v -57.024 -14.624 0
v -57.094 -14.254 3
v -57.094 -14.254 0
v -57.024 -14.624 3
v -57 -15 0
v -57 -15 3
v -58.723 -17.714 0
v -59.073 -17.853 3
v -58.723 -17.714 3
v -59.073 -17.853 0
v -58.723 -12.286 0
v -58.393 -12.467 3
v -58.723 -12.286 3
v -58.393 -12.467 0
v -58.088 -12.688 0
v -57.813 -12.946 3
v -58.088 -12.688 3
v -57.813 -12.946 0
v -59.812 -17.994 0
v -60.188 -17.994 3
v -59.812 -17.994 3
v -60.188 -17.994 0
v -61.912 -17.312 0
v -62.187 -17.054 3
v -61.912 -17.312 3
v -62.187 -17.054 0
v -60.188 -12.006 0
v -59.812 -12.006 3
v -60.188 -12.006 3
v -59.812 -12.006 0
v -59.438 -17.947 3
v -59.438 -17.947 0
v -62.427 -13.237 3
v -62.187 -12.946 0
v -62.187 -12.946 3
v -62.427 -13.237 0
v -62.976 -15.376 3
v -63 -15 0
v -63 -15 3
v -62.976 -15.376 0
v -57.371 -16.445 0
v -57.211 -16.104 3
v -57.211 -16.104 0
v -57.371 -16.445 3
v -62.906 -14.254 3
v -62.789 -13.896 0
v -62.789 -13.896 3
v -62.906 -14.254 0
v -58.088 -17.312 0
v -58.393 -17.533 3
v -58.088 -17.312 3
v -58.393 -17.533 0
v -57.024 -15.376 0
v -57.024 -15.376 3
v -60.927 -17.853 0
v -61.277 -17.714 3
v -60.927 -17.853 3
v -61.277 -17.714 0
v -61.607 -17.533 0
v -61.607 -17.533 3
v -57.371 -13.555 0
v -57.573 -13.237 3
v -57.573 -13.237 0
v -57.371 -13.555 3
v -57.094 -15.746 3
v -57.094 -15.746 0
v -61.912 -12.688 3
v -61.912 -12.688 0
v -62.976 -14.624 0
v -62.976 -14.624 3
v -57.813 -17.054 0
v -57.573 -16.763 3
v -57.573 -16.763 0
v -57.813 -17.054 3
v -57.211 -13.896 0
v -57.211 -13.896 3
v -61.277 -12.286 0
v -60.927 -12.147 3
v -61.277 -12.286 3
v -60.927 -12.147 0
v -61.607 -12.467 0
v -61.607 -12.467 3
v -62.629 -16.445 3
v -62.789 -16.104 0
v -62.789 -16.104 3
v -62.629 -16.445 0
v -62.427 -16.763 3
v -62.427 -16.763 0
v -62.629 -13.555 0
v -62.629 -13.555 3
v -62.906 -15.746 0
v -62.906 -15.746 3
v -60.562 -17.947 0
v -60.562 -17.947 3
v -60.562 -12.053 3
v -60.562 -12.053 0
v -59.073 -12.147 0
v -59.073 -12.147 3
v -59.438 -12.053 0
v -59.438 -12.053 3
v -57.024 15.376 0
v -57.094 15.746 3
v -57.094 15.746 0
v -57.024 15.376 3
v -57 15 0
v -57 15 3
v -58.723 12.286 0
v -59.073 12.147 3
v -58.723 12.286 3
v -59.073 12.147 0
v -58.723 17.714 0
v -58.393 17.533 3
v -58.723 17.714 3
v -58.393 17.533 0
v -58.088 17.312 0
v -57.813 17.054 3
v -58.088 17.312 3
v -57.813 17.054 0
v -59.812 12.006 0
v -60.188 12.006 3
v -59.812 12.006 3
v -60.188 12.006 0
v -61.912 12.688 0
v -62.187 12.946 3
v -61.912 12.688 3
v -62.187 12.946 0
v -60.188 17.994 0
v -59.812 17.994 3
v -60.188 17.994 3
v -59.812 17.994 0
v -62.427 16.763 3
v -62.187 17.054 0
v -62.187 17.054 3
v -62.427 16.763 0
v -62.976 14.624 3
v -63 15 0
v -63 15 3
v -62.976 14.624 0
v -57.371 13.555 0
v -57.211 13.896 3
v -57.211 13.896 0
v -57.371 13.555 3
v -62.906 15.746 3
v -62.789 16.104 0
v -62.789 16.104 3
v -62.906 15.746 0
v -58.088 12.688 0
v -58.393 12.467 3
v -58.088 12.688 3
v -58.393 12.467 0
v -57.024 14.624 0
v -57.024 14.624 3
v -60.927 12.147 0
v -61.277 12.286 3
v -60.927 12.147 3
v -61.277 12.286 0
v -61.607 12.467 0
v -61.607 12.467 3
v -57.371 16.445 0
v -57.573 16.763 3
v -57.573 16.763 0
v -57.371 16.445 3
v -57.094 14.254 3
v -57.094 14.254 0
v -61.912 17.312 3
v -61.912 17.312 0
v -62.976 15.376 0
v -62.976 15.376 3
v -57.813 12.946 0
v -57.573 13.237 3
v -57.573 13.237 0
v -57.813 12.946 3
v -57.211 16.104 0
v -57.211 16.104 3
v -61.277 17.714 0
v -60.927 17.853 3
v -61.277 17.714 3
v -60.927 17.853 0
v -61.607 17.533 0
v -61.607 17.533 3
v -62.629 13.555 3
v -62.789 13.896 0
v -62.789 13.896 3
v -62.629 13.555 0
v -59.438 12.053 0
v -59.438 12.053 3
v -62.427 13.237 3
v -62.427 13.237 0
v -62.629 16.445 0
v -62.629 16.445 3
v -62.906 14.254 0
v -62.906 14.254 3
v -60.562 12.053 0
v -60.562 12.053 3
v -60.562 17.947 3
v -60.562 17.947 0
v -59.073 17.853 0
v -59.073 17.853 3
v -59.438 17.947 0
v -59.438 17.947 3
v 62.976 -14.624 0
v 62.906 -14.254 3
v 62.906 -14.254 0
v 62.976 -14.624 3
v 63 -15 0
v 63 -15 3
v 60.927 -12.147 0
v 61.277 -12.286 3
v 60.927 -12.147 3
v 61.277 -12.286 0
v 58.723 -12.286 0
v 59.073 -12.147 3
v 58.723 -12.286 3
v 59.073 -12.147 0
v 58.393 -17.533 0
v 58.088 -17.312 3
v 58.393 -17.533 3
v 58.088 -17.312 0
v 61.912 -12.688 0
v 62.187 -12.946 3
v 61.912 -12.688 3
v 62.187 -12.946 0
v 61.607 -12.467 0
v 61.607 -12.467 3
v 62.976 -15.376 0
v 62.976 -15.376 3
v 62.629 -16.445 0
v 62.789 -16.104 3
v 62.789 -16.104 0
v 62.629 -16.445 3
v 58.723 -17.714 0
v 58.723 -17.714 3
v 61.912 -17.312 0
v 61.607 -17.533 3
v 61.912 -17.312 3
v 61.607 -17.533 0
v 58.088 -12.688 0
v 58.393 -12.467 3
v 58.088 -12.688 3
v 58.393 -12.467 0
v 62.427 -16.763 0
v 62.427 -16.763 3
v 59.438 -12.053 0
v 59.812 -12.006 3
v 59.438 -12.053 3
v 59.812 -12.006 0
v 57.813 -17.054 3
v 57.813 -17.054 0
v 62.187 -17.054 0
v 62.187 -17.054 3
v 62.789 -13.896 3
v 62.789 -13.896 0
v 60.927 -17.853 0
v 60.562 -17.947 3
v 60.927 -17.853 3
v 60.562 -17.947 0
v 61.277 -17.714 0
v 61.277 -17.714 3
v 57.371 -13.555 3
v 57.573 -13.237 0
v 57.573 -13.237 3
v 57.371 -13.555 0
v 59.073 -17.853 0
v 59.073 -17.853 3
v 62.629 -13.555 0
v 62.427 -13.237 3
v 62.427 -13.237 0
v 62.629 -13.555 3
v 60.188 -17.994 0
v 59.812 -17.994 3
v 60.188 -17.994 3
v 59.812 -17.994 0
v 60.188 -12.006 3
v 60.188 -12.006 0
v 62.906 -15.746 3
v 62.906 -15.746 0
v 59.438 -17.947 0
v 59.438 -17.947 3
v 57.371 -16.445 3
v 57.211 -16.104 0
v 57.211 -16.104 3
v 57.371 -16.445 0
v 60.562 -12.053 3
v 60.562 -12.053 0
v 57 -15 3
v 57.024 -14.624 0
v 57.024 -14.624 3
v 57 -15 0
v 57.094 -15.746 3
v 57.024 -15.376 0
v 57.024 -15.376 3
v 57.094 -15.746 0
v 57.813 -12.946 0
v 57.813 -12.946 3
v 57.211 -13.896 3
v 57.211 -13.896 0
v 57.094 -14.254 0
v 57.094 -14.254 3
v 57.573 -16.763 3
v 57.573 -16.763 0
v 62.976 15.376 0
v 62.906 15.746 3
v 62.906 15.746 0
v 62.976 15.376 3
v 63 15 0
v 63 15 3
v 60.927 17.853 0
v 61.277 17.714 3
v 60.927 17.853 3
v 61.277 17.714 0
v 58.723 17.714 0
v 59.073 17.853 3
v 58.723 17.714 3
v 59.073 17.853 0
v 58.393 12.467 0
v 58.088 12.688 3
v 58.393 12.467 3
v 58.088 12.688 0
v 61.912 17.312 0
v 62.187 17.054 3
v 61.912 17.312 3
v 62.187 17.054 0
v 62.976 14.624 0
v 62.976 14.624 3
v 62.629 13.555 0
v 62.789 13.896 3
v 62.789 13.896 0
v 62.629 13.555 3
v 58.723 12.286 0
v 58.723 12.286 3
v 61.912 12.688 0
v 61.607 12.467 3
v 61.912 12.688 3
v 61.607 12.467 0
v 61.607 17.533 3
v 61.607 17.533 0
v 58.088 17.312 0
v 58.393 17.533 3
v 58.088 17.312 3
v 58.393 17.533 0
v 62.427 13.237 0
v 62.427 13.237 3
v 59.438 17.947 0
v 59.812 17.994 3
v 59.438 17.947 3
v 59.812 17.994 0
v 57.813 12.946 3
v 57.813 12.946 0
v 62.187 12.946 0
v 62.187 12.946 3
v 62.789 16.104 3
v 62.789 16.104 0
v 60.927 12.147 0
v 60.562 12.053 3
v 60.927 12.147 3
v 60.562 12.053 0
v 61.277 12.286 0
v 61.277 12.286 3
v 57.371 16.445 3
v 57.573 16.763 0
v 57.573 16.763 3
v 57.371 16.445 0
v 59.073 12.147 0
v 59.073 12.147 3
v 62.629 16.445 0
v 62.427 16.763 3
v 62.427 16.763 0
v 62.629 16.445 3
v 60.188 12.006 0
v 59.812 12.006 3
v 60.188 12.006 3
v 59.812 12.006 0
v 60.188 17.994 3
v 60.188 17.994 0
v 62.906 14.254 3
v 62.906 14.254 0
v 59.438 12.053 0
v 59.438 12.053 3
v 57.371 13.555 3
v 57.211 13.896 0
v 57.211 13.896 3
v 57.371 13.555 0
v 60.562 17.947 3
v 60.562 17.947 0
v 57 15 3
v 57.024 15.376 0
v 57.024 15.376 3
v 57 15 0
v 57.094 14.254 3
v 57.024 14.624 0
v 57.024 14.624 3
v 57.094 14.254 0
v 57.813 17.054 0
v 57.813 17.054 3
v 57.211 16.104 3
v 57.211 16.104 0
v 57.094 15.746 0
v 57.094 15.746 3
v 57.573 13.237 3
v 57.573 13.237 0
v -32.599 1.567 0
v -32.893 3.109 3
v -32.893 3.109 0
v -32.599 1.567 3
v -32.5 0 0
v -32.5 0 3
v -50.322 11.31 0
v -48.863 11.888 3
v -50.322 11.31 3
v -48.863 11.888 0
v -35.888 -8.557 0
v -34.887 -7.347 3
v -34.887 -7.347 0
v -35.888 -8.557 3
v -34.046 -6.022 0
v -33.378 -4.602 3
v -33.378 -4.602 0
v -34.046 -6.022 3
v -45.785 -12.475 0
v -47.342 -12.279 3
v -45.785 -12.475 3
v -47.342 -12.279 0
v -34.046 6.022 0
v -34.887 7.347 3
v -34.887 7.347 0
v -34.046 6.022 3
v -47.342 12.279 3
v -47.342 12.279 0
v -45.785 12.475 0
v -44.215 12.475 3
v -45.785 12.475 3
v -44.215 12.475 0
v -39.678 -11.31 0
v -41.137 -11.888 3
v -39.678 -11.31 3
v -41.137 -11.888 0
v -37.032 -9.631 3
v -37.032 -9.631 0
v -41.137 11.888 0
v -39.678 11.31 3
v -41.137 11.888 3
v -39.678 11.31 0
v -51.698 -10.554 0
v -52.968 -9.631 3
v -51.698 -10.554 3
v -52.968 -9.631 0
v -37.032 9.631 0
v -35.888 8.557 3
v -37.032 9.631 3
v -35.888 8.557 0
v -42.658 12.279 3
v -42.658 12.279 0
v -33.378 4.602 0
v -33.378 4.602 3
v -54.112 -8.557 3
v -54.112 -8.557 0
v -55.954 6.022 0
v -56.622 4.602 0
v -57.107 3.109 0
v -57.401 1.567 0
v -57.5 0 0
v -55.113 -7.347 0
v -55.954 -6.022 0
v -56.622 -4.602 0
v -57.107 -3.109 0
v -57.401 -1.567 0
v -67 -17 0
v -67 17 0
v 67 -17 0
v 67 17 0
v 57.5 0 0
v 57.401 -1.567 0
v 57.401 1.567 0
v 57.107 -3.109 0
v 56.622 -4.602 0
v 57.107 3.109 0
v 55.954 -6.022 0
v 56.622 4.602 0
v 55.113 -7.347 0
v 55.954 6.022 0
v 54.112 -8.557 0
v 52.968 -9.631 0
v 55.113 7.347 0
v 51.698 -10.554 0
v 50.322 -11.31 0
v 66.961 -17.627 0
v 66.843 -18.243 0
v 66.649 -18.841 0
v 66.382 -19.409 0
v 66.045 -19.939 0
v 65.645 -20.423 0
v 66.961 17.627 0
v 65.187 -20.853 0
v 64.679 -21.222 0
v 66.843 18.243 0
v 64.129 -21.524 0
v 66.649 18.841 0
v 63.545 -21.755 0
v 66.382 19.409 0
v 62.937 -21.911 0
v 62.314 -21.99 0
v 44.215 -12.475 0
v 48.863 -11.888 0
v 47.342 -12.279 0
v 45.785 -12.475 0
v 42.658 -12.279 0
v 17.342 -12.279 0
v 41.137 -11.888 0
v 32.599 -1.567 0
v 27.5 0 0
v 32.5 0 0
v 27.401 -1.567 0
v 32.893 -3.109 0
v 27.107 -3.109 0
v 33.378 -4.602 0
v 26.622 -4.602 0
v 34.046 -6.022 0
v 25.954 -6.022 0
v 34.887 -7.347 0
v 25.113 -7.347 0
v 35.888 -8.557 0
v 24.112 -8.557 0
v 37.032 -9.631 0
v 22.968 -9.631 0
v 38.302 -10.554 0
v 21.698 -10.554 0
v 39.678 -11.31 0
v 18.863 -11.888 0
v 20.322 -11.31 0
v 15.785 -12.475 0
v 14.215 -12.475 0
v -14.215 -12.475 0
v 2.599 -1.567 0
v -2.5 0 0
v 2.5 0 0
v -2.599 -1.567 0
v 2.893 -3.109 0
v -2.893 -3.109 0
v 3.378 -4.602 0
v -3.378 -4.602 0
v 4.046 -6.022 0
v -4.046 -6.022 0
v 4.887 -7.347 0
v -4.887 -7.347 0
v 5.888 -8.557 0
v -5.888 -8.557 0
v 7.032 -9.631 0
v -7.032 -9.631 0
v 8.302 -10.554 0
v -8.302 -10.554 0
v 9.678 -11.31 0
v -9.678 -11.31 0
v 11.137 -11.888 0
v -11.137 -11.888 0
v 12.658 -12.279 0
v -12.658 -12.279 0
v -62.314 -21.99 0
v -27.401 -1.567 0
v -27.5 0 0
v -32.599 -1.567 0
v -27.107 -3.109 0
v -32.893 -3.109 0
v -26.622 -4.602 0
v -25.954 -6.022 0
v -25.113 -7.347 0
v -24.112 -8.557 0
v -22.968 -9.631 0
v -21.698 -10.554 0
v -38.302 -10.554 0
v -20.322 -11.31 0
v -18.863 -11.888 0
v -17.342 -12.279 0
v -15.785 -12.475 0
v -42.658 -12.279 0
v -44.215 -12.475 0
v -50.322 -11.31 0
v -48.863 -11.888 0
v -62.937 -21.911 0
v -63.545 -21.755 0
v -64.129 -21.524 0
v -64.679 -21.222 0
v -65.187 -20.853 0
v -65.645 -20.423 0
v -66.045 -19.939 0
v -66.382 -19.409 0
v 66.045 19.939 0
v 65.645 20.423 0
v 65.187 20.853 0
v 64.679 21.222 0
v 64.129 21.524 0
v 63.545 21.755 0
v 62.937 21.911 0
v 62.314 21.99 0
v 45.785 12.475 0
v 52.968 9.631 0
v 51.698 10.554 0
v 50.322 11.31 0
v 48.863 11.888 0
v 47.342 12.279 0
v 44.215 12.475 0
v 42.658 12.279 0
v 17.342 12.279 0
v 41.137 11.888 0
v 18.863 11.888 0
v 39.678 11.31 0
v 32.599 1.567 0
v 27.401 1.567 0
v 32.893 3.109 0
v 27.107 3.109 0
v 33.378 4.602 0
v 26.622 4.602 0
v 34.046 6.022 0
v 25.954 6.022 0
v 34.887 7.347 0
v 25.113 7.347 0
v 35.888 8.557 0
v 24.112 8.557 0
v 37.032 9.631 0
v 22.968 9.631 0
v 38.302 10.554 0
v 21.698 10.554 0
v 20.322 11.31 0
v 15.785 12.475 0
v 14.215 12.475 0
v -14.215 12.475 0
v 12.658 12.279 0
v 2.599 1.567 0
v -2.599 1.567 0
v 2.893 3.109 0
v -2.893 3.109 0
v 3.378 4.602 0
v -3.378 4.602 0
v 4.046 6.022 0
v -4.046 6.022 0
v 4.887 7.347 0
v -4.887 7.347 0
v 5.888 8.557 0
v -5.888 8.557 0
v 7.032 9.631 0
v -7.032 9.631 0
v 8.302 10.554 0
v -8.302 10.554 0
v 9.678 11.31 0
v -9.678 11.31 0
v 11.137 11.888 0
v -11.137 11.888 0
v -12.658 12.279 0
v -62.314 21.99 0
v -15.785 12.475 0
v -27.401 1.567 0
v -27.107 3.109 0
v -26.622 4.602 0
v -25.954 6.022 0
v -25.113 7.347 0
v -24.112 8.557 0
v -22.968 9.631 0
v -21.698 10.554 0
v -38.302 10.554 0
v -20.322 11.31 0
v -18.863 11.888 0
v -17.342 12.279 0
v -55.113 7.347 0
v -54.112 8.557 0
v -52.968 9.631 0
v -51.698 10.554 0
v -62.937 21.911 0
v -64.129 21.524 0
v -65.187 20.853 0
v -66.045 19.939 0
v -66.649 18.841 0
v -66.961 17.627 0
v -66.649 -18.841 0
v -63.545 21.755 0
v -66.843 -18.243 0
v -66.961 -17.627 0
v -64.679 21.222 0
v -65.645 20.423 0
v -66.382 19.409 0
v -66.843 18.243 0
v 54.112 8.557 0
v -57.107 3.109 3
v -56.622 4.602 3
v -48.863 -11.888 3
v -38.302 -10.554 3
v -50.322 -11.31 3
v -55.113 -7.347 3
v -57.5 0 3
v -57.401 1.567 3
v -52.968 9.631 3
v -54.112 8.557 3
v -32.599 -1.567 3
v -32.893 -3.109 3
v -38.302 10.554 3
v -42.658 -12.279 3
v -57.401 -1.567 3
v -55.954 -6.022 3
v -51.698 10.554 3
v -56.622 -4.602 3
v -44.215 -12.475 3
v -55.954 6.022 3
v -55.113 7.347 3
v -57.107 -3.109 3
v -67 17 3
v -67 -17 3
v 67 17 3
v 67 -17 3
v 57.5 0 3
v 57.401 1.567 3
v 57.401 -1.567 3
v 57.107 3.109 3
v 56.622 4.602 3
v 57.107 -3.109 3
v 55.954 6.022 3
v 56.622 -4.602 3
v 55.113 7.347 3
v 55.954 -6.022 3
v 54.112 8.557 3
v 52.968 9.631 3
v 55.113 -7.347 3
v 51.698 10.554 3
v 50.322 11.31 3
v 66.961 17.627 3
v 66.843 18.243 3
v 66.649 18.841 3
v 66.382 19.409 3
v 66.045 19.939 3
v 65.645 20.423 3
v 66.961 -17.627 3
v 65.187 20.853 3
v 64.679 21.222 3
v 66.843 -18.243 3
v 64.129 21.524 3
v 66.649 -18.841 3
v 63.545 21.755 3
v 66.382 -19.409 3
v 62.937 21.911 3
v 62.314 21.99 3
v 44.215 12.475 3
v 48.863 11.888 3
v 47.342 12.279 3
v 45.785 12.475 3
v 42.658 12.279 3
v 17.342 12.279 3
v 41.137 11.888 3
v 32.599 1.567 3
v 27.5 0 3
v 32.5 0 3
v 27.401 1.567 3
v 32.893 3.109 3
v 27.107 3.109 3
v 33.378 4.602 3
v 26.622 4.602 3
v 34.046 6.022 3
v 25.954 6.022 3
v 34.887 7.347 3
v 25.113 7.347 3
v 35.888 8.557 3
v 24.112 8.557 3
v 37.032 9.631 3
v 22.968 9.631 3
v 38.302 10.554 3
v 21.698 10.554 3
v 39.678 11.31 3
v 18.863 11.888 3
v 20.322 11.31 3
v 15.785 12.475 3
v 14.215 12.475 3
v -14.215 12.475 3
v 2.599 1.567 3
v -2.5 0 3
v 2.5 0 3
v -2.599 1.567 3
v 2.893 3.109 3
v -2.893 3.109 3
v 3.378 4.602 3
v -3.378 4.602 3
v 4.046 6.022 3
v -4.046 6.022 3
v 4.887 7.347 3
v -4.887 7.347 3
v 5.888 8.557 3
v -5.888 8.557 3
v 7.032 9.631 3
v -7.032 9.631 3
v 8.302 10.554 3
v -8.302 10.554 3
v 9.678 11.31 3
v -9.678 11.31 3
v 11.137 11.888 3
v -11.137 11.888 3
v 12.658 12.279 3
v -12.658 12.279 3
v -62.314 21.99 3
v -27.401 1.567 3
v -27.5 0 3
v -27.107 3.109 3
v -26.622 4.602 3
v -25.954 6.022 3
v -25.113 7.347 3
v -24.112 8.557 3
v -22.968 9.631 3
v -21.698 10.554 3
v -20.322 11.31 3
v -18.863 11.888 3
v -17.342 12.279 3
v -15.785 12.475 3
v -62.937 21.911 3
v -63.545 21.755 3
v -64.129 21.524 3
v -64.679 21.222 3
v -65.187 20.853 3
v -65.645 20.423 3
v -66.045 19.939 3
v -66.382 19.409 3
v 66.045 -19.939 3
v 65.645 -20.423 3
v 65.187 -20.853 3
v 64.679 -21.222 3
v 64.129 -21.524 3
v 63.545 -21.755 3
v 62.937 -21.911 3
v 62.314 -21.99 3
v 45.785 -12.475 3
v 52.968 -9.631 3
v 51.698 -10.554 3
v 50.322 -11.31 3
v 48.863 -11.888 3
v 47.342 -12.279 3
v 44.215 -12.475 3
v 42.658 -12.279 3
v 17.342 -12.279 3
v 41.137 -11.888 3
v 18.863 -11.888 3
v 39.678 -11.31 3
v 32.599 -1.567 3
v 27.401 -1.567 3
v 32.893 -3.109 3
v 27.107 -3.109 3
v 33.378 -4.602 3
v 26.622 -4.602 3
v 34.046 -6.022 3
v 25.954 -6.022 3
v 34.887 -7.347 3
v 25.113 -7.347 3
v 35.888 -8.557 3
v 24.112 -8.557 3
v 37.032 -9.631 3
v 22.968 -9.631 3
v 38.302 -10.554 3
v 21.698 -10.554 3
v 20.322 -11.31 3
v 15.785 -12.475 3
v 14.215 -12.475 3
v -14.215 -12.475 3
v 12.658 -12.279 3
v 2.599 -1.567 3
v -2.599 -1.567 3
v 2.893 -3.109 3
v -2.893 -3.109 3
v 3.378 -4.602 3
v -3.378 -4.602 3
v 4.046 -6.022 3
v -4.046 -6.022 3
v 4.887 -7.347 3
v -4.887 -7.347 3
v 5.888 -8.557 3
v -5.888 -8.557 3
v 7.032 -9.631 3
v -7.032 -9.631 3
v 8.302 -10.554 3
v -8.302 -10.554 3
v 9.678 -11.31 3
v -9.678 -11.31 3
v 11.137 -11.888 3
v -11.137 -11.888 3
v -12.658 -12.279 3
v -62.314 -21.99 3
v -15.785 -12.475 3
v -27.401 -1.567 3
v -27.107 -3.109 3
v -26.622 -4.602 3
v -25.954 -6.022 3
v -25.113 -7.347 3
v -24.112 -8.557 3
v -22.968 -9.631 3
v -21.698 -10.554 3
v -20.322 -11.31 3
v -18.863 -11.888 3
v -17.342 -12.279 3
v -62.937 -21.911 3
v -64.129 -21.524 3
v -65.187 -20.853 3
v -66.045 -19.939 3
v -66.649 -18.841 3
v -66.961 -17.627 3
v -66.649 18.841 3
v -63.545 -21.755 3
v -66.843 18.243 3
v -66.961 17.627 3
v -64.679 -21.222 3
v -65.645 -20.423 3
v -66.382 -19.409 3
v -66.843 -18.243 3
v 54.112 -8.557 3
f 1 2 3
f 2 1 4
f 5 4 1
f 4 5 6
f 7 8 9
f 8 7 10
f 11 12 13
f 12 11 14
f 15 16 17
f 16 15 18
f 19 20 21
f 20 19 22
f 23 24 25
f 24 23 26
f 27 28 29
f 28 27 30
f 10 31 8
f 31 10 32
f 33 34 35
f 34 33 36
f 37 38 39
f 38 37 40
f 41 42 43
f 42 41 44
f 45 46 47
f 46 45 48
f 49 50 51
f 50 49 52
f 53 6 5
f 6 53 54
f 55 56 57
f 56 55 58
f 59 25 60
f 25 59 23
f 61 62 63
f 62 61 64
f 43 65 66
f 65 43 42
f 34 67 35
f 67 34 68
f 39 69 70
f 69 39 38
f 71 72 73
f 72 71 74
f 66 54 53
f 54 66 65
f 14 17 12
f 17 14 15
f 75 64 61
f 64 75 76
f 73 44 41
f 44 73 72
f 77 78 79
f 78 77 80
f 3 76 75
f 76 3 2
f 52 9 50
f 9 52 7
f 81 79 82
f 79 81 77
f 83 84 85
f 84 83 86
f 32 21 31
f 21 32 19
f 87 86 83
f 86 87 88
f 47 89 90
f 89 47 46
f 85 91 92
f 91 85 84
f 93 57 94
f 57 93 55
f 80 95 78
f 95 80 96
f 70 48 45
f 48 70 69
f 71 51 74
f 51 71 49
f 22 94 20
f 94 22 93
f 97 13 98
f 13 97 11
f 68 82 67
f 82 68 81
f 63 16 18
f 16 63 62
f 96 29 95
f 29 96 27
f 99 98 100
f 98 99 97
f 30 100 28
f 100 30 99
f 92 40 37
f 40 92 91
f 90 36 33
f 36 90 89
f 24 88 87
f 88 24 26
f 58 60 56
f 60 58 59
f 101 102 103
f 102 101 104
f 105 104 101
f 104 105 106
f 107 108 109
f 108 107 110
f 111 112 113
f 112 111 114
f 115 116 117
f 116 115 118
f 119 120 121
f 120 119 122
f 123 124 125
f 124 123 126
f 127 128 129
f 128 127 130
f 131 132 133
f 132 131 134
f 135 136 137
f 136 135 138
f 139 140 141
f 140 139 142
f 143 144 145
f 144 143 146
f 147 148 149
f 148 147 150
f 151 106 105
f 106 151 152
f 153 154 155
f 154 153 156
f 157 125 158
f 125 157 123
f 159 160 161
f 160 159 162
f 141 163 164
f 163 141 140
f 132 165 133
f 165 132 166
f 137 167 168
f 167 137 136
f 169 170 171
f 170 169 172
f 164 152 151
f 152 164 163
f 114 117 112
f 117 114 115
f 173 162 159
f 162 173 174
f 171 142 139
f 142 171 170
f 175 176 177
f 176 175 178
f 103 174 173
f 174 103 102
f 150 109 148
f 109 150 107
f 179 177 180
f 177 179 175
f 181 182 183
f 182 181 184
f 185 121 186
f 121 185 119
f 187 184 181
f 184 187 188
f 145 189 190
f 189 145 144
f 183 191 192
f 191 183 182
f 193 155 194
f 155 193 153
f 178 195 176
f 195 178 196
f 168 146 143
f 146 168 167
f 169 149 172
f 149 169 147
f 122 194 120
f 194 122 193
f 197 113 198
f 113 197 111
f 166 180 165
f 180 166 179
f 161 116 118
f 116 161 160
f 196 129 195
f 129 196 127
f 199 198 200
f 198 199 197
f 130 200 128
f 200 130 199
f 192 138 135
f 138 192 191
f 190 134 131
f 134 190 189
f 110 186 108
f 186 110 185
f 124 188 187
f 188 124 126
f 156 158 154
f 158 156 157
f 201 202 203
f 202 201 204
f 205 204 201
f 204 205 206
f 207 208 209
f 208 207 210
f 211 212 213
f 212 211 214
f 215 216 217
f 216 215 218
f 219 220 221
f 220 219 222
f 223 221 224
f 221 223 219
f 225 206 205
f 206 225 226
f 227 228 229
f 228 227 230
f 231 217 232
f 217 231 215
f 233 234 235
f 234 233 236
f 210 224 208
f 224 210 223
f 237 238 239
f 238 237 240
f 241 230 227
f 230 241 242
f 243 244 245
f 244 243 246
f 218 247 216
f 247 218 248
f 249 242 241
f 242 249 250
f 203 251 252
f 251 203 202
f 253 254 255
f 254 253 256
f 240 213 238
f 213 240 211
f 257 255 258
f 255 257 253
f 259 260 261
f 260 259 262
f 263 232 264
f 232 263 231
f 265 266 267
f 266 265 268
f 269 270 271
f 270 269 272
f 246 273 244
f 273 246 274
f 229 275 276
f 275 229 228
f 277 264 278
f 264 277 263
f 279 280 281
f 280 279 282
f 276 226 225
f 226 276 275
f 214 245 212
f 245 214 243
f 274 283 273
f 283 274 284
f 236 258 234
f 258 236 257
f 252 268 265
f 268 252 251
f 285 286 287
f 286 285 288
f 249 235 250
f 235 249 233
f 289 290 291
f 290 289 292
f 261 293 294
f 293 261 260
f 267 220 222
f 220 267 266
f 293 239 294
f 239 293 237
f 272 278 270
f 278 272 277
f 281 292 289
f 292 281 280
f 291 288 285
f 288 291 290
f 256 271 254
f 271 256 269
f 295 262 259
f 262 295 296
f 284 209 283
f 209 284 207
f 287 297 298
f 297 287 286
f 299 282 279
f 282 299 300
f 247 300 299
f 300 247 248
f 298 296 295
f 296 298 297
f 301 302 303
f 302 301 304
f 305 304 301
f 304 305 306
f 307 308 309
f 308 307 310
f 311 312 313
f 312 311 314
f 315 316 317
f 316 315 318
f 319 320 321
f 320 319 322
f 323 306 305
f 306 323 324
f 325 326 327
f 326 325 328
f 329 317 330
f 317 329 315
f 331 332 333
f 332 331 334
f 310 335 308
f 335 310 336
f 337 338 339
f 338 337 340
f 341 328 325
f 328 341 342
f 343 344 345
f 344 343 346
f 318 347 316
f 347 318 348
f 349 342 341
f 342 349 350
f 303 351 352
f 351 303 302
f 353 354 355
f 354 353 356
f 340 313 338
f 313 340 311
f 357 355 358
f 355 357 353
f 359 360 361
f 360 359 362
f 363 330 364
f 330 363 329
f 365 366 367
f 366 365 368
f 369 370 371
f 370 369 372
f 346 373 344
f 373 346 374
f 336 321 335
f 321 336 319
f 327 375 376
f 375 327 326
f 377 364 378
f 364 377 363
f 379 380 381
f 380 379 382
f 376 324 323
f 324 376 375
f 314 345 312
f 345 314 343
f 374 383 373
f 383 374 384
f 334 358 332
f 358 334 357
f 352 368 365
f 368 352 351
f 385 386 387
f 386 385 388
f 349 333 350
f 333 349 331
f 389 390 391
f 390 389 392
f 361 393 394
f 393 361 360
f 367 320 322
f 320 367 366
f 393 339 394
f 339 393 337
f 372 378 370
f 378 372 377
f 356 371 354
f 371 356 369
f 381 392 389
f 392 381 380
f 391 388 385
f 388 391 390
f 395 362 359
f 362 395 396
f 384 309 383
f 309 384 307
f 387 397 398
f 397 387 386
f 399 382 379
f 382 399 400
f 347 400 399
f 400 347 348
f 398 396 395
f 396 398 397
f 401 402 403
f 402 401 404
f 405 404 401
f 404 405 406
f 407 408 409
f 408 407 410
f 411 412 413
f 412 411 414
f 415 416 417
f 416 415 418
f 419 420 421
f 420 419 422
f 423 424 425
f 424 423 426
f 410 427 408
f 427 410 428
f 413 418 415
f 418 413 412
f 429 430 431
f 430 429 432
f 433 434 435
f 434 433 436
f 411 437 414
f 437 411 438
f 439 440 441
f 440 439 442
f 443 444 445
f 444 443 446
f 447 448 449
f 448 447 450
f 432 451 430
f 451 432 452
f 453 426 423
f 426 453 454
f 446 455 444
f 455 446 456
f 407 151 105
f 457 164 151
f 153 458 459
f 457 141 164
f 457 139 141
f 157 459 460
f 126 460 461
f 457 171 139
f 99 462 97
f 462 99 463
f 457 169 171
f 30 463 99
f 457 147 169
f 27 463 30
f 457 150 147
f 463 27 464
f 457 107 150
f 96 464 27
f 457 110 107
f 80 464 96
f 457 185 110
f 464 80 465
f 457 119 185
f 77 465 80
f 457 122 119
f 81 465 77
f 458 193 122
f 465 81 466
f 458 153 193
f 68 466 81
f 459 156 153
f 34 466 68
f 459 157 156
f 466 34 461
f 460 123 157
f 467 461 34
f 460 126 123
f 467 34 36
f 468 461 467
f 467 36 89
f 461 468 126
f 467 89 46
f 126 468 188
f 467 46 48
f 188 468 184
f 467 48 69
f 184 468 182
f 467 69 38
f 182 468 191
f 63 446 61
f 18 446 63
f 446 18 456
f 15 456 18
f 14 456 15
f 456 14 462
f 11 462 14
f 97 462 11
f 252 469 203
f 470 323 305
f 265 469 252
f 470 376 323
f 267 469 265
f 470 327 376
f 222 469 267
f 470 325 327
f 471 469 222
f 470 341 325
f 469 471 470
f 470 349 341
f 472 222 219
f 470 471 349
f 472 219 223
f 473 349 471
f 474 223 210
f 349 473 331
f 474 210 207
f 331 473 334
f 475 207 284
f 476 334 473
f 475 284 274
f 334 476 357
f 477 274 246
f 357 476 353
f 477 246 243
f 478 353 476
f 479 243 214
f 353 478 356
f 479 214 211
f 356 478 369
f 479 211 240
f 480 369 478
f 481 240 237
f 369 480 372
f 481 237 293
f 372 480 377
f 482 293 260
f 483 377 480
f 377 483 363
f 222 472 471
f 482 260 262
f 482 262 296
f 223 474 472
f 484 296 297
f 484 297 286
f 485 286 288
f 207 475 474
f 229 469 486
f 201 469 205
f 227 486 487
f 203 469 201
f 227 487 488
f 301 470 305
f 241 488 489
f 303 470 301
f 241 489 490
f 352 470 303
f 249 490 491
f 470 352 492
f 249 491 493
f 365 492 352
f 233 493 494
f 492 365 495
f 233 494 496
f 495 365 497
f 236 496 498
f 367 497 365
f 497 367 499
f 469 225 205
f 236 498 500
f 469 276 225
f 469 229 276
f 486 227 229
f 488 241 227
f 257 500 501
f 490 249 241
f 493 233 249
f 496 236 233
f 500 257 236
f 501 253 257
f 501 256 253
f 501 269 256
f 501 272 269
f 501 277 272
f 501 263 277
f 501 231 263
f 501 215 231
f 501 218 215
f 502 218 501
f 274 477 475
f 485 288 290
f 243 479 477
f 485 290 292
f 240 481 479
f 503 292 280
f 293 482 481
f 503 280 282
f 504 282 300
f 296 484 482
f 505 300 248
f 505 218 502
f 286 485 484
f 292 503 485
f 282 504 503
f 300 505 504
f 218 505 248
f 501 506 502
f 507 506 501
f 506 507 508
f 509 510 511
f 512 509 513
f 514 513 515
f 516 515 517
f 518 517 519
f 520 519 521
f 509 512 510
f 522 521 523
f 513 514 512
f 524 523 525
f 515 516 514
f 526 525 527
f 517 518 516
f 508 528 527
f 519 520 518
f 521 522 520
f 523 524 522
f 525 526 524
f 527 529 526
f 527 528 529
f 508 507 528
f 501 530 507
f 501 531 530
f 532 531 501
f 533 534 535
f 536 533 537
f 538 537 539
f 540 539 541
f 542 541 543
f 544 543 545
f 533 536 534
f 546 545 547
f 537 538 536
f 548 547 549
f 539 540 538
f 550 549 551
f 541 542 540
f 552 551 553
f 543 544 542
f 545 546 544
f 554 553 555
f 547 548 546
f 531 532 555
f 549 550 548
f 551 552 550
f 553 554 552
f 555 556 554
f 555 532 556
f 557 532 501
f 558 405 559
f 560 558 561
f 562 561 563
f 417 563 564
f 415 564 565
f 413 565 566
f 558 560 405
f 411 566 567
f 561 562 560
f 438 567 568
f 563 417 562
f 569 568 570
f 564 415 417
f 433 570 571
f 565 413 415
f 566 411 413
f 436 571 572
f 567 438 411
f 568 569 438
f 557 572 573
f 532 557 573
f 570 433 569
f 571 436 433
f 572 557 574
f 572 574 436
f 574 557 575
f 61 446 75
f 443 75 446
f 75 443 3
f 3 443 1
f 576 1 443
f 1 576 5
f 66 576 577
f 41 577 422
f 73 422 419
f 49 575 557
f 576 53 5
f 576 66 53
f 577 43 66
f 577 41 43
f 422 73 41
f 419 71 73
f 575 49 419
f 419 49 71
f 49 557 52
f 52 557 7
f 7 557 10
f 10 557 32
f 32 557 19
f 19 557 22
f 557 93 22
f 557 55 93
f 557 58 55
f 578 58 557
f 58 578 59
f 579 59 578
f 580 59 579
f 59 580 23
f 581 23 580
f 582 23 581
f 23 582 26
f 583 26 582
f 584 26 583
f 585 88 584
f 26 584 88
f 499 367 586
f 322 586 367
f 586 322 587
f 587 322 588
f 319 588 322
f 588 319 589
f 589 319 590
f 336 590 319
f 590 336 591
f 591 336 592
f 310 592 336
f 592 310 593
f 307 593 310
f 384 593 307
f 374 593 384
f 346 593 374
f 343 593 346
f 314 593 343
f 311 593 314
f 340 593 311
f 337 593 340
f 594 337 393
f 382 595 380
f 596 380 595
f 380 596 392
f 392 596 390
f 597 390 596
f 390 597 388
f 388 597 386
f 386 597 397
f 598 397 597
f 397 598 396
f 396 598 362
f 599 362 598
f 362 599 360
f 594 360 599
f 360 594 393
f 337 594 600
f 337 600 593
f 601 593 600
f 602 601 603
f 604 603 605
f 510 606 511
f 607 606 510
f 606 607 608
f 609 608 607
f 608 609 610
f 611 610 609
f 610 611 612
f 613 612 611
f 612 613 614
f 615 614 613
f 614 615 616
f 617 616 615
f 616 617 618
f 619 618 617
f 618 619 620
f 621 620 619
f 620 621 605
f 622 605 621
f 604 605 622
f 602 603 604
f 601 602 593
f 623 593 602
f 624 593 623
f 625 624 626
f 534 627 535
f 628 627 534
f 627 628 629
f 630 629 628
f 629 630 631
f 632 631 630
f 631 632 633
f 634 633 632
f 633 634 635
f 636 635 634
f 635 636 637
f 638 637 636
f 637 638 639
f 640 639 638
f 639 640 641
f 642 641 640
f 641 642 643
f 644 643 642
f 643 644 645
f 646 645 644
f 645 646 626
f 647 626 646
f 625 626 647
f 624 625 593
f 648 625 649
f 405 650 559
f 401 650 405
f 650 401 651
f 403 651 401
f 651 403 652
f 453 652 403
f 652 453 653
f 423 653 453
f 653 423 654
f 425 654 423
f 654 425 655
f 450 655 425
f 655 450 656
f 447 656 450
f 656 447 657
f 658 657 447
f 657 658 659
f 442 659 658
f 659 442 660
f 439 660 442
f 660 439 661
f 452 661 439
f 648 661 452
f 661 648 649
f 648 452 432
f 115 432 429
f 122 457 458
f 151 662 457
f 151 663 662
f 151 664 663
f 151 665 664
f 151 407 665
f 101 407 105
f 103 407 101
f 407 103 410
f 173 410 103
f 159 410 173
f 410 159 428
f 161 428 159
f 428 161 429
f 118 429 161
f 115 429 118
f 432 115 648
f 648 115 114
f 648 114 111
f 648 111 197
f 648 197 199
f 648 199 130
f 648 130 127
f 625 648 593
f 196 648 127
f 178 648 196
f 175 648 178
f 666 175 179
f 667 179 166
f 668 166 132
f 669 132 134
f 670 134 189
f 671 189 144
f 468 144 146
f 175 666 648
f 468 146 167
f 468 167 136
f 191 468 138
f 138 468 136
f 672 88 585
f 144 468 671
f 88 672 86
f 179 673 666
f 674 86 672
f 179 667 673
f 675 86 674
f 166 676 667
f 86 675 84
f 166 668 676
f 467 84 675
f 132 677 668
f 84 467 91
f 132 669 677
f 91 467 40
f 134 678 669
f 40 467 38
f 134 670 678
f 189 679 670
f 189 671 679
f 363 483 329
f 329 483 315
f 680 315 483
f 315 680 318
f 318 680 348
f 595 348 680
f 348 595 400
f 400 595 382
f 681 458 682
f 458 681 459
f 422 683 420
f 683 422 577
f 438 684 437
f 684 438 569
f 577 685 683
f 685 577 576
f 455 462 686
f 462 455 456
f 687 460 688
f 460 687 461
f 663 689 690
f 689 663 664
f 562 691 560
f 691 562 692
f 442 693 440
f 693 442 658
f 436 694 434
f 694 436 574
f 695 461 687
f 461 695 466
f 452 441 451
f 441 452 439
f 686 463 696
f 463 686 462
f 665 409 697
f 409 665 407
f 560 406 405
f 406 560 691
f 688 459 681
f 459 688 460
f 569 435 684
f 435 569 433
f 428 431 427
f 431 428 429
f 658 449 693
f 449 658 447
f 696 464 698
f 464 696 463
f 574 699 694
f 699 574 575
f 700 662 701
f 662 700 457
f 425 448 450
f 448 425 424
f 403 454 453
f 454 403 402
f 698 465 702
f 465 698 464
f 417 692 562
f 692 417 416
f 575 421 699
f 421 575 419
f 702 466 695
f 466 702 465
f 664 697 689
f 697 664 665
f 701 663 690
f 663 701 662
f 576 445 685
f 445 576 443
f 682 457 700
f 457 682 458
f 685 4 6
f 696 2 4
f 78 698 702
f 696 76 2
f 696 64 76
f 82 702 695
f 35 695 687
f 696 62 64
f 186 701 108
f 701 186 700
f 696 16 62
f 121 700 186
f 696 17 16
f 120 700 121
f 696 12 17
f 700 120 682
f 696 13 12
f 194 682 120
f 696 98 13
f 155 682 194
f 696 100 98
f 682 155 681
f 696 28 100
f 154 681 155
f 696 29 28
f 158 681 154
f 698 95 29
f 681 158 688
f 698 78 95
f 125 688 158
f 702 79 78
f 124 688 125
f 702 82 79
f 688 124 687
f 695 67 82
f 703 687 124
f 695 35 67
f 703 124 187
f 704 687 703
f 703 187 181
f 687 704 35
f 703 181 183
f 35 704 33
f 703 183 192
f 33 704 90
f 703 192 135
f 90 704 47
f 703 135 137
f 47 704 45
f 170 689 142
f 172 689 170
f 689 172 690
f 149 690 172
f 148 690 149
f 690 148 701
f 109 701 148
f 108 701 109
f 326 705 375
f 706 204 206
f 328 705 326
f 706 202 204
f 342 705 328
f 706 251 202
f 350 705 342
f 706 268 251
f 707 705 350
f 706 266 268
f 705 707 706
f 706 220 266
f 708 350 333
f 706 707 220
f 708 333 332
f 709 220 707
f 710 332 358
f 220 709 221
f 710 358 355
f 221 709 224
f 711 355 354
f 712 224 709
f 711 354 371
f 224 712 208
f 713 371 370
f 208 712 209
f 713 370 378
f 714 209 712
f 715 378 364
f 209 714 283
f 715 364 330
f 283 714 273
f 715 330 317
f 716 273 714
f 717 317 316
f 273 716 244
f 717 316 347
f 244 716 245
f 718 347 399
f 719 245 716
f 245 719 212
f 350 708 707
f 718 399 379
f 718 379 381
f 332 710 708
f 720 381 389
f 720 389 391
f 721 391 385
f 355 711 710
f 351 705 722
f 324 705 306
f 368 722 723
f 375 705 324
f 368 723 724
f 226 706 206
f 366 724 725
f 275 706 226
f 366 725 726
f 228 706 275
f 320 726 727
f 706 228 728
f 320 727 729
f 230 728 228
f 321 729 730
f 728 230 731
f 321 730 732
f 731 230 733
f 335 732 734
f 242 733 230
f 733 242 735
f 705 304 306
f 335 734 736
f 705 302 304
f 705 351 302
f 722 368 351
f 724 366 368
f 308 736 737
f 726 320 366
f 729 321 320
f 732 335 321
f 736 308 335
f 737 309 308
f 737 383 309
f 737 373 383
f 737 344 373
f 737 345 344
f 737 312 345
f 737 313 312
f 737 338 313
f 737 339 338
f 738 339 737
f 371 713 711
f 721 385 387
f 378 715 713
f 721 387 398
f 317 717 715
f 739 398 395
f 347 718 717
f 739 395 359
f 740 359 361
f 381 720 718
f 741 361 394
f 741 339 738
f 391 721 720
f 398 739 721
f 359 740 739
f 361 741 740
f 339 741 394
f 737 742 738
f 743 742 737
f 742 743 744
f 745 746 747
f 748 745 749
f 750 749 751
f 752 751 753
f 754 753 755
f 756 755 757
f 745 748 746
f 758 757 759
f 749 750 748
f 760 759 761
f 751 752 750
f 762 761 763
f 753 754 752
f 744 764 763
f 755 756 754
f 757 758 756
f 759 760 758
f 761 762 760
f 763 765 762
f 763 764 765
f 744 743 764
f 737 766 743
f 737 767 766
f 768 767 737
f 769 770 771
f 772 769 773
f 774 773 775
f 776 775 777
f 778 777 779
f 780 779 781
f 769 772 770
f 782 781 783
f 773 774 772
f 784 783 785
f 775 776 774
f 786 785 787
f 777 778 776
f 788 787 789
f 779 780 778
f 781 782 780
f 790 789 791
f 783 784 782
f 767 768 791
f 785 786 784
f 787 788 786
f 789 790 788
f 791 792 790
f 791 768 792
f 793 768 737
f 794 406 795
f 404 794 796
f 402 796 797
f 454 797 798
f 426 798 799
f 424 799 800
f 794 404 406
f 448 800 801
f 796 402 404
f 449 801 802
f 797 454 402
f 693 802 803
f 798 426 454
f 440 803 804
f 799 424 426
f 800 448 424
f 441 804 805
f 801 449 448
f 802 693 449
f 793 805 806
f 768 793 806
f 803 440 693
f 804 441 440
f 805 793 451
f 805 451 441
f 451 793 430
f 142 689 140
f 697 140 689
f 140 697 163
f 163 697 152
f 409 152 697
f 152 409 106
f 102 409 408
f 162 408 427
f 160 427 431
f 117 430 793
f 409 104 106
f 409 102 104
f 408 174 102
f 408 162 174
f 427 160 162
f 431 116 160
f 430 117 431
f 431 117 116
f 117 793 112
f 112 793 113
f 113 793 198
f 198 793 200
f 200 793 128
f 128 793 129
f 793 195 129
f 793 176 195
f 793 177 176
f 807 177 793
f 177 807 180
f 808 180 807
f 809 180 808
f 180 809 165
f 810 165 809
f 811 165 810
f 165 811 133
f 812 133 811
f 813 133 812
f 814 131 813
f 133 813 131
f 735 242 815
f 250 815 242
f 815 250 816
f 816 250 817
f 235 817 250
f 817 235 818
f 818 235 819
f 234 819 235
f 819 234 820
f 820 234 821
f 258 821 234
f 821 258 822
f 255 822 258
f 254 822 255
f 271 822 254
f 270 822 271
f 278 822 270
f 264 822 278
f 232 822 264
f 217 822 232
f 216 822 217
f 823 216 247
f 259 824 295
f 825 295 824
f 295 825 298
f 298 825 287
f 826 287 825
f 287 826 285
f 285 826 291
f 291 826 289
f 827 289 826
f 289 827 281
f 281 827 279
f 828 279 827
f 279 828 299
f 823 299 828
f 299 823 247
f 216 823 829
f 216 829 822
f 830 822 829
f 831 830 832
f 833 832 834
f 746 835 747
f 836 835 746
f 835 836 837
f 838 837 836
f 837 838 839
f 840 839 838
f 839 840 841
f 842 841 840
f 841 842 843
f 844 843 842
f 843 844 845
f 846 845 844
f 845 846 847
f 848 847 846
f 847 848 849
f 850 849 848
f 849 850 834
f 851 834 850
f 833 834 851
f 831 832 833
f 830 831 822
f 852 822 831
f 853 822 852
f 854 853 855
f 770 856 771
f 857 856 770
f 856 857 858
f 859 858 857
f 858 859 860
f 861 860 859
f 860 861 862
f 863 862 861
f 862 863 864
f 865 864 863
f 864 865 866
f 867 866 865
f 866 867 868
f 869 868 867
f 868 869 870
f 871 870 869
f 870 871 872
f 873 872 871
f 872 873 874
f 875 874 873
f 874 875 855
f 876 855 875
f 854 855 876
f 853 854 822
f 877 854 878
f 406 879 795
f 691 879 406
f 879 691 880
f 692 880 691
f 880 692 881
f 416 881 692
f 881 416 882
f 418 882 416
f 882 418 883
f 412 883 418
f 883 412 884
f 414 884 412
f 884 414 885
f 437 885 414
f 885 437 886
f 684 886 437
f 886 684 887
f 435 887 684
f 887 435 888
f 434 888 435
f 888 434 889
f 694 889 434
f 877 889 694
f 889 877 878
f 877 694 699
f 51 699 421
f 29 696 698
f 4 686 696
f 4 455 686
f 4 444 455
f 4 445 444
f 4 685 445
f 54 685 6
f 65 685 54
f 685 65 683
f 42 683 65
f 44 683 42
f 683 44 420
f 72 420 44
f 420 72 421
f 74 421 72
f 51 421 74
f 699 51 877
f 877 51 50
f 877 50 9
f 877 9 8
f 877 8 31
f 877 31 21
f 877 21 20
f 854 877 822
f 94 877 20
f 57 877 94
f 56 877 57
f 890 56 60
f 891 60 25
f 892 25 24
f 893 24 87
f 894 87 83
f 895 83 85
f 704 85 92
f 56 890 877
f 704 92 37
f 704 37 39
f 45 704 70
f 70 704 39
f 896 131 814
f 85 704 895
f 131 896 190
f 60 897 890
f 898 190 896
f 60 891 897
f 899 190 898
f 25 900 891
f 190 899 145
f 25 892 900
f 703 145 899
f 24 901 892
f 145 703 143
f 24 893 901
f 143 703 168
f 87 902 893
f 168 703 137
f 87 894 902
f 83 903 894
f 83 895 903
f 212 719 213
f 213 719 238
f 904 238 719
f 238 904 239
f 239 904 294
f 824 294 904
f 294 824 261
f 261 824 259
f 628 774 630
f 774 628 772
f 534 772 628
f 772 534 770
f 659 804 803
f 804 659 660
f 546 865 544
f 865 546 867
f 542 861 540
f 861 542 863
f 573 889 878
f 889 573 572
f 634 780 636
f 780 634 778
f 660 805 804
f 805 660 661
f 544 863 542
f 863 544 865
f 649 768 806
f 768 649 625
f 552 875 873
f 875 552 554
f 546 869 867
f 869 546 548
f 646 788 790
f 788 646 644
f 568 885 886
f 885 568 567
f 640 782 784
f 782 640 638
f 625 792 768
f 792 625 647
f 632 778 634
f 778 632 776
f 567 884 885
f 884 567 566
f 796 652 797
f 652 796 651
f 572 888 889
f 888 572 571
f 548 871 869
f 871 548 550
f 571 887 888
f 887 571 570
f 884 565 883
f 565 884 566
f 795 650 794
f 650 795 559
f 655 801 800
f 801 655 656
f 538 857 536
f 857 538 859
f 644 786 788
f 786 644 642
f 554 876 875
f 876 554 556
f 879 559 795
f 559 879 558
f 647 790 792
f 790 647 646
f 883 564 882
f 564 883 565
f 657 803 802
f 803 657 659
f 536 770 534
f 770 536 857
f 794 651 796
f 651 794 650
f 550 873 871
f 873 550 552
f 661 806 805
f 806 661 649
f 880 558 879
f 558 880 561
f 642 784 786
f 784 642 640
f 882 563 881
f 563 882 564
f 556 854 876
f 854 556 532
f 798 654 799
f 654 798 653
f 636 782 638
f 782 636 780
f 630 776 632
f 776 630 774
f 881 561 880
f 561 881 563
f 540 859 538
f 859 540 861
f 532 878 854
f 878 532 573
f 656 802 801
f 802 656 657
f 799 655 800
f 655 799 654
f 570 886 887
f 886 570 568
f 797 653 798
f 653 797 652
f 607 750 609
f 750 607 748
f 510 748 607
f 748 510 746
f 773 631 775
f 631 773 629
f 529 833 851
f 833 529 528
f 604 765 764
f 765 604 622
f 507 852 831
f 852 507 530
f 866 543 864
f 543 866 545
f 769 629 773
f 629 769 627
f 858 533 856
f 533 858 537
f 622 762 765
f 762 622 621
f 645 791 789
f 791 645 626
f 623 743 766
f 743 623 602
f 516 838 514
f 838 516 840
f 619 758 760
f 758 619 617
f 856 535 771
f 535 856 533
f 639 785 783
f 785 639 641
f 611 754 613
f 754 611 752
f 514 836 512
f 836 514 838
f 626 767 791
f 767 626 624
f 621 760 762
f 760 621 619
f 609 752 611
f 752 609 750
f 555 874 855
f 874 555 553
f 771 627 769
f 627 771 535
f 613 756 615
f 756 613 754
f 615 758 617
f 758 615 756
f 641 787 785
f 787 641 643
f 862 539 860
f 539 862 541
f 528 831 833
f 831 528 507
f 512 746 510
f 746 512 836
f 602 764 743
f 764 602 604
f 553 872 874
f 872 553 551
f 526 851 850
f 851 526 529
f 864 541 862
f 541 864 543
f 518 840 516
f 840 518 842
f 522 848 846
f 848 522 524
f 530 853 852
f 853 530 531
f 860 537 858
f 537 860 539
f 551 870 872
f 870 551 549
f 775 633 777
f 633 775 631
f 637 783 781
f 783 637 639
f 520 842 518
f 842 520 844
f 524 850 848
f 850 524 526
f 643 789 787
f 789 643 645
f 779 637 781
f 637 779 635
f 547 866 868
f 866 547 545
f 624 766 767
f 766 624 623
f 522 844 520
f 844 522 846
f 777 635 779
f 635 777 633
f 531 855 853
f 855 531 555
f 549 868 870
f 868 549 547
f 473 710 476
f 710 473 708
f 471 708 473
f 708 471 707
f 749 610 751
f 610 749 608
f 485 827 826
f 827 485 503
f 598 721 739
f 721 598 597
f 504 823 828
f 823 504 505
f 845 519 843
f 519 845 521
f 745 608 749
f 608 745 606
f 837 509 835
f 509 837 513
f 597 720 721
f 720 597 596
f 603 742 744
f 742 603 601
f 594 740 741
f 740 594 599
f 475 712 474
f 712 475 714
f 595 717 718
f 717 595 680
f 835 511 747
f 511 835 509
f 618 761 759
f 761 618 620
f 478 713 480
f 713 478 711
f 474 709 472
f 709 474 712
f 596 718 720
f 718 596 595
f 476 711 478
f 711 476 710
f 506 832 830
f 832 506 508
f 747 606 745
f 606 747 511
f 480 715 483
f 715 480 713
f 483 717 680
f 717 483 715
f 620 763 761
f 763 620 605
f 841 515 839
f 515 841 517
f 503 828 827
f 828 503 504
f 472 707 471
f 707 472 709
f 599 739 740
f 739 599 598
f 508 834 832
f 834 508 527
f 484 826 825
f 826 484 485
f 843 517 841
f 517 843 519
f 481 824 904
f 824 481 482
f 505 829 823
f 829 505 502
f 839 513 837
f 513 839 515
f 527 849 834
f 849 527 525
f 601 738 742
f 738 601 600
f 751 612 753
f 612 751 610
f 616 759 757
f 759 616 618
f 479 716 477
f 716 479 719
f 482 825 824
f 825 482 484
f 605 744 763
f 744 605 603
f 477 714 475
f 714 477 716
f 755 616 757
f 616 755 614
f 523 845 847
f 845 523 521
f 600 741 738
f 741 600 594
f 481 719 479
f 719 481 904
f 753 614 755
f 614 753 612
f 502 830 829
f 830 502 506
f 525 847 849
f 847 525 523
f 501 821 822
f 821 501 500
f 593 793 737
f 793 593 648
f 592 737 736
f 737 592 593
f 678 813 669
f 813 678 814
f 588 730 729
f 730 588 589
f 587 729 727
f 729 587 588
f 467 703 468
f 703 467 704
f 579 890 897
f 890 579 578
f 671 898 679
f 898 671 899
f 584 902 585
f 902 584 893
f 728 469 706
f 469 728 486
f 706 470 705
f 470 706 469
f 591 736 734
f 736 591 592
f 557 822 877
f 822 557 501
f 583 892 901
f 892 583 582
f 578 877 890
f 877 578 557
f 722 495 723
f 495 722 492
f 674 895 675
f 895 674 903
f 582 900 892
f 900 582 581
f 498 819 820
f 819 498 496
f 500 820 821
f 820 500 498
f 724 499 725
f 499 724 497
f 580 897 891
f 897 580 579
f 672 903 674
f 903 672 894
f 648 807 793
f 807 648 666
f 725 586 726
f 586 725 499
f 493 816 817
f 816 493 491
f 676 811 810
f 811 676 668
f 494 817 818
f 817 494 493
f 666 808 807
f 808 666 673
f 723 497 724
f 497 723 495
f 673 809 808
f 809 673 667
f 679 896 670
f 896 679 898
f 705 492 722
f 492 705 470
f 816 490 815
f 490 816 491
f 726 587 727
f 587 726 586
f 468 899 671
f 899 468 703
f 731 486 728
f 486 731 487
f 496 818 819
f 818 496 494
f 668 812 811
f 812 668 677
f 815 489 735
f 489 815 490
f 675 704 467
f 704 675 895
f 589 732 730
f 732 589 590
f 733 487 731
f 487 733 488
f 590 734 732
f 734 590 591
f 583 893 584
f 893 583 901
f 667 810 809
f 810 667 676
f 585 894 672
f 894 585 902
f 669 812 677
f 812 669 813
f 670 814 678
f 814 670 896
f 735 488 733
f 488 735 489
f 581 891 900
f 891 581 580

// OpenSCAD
$fn = 50;


difference() {
	union() {
		hull() {
			translate(v = [-62.0000000000, 17.0000000000, 0]) {
				cylinder(h = 3, r = 5);
			}
			translate(v = [62.0000000000, 17.0000000000, 0]) {
				cylinder(h = 3, r = 5);
			}
			translate(v = [-62.0000000000, -17.0000000000, 0]) {
				cylinder(h = 3, r = 5);
			}
			translate(v = [62.0000000000, -17.0000000000, 0]) {
				cylinder(h = 3, r = 5);
			}
		}
	}
	union() {
		#translate(v = [-60.0000000000, -15.0000000000, -100.0000000000]) {
			cylinder(h = 200, r = 3.0000000000);
		}
		#translate(v = [-60.0000000000, 15.0000000000, -100.0000000000]) {
			cylinder(h = 200, r = 3.0000000000);
		}
		#translate(v = [60.0000000000, -15.0000000000, -100.0000000000]) {
			cylinder(h = 200, r = 3.0000000000);
		}
		#translate(v = [60.0000000000, 15.0000000000, -100.0000000000]) {
			cylinder(h = 200, r = 3.0000000000);
		}
		#translate(v = [-45.0000000000, 0, 0]) {
			cylinder(h = 3, r = 12.5000000000);
		}
		#translate(v = [-15.0000000000, 0, 0]) {
			cylinder(h = 3, r = 12.5000000000);
		}
		#translate(v = [15.0000000000, 0, 0]) {
			cylinder(h = 3, r = 12.5000000000);
		}
		#translate(v = [45.0000000000, 0, 0]) {
			cylinder(h = 3, r = 12.5000000000);
		}
	}
}
